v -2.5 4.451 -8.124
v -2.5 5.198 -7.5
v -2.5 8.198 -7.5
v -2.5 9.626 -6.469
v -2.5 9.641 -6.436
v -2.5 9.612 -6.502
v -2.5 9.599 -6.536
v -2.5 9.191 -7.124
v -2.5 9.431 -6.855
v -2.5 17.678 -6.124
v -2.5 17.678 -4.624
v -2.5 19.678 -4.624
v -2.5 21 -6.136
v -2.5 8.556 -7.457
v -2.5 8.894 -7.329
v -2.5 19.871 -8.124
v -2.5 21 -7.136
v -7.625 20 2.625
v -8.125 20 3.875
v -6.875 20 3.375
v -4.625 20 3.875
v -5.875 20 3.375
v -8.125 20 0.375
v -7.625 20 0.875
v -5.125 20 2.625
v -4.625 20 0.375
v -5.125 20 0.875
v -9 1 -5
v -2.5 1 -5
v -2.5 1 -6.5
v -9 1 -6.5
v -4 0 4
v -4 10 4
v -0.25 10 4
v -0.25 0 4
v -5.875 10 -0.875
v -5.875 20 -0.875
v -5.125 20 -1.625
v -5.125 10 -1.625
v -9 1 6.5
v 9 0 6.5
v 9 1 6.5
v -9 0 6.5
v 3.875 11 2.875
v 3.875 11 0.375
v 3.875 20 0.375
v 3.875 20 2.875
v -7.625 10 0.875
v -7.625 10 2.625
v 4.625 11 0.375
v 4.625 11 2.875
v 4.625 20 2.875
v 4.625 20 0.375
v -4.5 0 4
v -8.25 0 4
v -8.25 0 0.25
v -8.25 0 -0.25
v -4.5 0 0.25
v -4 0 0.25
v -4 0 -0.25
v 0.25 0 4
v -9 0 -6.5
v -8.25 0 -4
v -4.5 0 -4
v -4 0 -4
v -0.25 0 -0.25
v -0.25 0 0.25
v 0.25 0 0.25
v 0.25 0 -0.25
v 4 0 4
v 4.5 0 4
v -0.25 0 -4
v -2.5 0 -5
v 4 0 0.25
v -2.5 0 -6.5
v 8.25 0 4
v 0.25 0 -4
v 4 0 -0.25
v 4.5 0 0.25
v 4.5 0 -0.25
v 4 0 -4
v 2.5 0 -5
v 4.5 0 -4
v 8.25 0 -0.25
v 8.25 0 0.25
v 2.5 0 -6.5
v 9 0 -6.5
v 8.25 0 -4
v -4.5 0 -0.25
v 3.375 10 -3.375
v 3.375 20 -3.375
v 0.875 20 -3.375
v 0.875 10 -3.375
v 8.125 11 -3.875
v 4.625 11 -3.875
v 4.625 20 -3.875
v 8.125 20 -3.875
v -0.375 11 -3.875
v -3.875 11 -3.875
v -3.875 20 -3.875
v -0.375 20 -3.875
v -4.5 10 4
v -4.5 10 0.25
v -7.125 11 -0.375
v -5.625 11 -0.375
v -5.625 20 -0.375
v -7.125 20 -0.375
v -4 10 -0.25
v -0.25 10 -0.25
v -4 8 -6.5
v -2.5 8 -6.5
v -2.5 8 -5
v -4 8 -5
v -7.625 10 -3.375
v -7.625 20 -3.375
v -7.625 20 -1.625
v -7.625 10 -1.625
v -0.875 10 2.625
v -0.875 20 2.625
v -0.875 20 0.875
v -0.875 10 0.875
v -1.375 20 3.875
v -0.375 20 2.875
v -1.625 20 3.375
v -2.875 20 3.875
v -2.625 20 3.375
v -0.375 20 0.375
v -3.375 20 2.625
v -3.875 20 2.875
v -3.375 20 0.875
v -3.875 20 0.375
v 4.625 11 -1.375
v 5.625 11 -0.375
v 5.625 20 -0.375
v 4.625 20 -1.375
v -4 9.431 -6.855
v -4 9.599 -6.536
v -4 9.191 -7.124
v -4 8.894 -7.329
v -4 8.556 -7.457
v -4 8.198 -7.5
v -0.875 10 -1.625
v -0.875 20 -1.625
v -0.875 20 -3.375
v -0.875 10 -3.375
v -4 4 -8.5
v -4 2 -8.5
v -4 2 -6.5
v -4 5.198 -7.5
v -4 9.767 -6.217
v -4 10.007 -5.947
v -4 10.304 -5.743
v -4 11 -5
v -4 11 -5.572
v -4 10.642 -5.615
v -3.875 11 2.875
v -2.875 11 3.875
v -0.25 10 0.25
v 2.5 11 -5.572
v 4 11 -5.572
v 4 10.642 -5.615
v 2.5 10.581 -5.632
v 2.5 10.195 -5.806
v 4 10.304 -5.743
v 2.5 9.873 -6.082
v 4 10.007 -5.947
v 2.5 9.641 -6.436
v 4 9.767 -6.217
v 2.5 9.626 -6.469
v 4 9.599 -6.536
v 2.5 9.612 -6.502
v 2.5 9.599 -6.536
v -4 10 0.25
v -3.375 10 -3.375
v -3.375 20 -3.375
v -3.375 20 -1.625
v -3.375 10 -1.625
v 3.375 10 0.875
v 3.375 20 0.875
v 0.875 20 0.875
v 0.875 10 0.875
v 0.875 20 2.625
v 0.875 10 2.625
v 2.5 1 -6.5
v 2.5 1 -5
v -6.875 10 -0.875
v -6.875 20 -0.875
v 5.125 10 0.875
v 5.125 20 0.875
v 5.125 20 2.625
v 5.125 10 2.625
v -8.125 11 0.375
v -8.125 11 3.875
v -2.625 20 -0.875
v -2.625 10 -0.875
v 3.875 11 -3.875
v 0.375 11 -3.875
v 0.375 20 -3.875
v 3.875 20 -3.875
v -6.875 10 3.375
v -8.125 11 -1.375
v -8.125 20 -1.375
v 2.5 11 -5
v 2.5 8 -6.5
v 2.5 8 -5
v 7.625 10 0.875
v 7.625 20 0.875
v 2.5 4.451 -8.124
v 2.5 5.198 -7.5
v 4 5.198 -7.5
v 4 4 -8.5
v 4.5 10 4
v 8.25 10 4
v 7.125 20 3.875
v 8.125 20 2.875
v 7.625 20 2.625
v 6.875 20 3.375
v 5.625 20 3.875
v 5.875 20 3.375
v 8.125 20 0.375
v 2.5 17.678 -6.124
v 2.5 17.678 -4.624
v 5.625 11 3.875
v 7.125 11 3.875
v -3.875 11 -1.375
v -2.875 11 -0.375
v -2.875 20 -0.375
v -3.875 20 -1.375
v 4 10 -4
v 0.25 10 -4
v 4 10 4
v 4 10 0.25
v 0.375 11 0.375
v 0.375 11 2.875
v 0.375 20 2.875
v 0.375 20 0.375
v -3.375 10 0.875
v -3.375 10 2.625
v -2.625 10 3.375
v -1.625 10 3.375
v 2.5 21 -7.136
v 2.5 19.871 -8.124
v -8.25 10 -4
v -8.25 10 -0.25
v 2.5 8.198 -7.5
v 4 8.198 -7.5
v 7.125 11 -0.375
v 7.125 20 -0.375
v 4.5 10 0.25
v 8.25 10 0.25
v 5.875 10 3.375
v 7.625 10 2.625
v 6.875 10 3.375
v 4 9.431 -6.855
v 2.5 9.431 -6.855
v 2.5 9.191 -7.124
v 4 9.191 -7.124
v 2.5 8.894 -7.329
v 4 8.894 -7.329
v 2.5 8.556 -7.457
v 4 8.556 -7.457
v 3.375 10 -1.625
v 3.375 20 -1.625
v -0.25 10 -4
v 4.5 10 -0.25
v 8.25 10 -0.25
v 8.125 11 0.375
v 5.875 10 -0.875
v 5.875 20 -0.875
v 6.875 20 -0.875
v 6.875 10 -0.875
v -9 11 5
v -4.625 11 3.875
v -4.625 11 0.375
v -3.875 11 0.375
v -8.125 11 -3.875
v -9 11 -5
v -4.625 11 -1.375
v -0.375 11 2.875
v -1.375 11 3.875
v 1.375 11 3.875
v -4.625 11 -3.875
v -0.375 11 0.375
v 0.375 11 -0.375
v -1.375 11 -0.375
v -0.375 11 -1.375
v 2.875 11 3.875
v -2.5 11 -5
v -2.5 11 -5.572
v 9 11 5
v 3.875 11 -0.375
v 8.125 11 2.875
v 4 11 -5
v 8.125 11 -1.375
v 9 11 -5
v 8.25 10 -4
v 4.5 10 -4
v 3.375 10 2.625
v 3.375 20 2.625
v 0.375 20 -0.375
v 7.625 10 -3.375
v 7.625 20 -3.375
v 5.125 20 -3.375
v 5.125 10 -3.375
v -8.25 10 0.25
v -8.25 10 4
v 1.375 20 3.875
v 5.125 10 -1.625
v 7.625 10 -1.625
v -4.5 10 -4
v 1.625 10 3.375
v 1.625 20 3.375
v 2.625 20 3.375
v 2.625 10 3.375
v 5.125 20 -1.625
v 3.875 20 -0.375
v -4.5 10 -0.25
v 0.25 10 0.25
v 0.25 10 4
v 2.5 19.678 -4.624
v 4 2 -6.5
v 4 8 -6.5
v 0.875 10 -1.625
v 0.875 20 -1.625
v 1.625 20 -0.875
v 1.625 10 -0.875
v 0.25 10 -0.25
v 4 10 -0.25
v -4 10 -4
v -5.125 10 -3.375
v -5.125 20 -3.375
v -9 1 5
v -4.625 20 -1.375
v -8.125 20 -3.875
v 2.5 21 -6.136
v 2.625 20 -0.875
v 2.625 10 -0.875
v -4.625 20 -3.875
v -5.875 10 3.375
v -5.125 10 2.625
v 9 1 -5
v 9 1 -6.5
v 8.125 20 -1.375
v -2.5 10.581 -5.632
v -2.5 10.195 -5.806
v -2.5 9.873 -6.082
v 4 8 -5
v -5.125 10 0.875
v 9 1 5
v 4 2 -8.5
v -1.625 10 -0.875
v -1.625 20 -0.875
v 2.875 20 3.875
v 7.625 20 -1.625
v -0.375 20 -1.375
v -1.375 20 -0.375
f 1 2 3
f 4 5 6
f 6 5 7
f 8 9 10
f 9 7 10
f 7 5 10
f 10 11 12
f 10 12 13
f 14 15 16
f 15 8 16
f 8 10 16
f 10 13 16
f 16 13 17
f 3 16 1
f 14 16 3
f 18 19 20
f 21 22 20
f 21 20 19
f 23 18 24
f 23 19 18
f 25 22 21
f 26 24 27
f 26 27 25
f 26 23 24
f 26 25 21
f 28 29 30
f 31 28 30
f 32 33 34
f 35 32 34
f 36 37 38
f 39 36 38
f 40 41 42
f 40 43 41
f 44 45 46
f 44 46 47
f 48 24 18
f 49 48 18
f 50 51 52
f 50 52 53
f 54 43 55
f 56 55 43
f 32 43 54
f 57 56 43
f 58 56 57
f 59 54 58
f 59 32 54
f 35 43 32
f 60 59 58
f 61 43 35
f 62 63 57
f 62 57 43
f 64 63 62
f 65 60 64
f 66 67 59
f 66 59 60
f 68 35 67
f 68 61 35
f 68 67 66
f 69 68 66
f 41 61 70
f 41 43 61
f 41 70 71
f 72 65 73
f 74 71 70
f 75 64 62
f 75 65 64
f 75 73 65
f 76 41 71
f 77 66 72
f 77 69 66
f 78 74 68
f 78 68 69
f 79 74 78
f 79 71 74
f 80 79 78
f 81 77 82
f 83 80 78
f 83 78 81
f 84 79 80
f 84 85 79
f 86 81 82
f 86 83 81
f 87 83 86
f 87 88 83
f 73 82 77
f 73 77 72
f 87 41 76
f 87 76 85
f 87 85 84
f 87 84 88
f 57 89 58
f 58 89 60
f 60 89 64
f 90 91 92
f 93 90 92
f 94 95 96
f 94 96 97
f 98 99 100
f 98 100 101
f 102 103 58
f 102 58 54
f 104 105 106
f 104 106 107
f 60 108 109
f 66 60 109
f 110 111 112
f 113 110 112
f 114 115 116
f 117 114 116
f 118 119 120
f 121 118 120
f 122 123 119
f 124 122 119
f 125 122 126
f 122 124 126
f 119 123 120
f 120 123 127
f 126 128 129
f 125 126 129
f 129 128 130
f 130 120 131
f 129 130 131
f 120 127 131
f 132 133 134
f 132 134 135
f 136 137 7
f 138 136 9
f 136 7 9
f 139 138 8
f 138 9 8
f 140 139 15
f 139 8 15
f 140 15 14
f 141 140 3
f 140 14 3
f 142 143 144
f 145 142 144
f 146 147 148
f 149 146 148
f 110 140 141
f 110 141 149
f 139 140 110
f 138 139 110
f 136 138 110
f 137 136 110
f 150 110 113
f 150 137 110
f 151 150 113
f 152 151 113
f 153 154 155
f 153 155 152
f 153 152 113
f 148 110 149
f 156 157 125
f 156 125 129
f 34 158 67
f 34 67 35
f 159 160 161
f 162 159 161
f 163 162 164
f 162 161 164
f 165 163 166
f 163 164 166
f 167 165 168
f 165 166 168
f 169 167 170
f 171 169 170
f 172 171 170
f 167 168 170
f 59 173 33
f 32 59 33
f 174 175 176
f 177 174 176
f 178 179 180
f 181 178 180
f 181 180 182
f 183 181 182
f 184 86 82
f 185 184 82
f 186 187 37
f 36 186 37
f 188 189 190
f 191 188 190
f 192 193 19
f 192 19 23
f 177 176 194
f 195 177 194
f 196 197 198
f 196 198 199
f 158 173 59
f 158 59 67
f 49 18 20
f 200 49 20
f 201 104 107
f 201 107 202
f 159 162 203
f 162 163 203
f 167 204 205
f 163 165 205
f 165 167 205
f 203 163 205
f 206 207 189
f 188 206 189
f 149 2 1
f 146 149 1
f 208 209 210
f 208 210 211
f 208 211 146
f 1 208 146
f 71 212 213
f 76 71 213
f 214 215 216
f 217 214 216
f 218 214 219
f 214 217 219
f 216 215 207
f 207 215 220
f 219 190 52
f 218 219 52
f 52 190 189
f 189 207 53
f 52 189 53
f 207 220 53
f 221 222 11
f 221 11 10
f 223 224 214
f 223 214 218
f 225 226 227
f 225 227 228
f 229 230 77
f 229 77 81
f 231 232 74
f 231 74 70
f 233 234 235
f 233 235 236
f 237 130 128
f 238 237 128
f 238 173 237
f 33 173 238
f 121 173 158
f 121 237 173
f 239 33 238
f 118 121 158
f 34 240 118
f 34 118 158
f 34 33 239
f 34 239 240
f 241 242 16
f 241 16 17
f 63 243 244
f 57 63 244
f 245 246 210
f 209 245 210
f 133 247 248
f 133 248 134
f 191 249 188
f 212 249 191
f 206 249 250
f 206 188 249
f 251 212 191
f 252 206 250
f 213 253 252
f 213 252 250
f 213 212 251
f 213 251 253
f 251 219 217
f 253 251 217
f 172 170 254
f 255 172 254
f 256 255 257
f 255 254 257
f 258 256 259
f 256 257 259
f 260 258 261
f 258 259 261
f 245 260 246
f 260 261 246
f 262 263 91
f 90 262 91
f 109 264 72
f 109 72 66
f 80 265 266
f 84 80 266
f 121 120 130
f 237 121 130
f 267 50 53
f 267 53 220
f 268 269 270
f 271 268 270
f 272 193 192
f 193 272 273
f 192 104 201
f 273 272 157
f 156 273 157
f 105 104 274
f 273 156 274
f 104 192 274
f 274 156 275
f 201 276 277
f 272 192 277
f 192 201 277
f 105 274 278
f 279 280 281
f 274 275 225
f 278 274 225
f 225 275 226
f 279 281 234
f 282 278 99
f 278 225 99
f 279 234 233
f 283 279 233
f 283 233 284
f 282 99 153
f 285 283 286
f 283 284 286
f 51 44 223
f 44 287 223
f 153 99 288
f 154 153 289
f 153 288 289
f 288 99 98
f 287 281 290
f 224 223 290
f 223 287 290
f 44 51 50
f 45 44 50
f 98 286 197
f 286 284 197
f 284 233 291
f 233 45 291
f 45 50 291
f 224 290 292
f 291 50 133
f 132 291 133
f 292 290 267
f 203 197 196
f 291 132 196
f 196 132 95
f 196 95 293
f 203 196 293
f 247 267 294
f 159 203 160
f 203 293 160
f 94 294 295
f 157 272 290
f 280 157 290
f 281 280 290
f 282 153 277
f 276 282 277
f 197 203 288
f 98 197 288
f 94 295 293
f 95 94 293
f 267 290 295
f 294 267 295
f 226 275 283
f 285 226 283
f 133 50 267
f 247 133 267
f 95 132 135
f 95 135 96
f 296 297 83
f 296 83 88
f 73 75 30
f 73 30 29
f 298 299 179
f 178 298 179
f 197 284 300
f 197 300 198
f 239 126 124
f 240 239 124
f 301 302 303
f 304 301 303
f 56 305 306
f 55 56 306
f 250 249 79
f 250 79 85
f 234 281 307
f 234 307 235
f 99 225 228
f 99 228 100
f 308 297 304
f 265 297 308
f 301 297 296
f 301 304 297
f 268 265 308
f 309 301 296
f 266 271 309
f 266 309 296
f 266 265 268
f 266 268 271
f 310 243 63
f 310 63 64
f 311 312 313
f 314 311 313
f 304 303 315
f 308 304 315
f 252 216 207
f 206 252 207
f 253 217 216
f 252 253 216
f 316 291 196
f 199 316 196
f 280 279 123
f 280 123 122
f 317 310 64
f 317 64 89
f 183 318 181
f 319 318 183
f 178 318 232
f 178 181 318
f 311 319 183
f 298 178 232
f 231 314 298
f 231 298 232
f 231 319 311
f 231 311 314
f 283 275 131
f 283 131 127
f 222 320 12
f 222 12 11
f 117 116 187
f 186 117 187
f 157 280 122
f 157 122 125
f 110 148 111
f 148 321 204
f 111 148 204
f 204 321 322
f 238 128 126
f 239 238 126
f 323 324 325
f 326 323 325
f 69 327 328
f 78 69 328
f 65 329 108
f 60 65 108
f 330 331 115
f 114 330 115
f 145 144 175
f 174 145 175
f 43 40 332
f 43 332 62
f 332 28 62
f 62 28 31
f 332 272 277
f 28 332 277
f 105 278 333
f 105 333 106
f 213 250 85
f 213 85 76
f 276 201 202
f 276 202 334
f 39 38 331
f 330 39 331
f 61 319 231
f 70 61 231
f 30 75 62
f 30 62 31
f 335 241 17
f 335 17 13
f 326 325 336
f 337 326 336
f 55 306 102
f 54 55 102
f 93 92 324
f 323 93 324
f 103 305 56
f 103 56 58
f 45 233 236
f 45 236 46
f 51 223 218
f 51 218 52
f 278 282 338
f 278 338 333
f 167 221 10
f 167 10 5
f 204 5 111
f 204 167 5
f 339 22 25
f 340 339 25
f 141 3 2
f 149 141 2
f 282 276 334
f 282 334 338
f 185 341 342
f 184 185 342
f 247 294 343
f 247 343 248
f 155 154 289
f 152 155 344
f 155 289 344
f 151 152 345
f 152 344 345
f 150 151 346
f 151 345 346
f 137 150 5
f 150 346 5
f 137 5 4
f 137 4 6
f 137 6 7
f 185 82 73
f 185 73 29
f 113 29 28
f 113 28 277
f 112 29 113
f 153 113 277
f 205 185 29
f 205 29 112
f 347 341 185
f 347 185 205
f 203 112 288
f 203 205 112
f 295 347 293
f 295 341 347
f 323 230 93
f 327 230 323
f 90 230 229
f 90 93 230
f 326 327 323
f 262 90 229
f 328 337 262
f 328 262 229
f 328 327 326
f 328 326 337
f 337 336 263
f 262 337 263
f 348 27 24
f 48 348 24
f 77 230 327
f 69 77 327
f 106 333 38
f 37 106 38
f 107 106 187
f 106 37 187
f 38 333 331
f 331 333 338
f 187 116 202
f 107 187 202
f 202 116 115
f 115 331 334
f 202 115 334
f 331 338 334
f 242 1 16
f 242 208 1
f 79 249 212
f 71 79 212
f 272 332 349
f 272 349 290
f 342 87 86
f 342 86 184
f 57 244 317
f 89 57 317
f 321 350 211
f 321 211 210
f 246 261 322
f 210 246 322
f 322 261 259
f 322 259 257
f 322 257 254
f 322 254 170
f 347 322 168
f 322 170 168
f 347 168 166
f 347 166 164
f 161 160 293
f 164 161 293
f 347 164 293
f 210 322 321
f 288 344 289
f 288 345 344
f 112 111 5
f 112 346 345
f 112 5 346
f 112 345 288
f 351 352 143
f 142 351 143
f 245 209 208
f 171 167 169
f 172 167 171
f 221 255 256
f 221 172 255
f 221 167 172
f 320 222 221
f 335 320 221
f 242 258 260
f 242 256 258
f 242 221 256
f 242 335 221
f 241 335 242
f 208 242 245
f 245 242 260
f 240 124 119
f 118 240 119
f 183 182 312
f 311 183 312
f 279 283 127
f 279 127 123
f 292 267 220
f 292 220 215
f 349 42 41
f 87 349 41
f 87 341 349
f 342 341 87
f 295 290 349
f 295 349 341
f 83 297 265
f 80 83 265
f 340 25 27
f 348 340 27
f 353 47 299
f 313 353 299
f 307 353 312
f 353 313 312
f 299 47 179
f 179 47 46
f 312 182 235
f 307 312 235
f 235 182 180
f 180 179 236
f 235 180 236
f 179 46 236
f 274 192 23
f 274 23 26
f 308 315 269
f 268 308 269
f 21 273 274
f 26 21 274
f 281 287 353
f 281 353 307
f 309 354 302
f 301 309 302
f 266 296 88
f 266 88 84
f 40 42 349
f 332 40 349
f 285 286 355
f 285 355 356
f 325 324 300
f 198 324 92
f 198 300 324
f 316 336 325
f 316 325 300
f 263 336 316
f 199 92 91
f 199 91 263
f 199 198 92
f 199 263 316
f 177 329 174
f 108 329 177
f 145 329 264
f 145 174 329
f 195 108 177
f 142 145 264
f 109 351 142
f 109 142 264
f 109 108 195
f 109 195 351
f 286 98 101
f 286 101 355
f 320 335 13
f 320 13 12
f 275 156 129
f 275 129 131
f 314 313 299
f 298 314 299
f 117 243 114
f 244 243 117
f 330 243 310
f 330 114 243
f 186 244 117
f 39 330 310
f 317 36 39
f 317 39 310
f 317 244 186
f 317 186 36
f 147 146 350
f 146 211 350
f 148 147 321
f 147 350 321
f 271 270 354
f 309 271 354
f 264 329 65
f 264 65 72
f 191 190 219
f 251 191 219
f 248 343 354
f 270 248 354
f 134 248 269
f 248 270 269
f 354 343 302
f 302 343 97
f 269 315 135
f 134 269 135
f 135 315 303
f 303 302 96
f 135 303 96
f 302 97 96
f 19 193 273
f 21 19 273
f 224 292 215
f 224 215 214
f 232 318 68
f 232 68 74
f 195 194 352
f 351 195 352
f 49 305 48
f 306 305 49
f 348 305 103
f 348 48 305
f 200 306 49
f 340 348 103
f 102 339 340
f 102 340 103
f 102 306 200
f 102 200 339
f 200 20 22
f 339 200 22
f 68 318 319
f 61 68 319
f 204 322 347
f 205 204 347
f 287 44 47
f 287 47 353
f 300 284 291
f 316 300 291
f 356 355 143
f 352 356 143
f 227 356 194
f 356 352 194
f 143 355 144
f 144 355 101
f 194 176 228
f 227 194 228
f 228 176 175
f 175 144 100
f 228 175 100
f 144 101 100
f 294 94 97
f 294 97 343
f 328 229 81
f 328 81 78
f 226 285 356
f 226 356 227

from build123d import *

# Parameters (mm, degrees)
SKIZZE1_W                       = 10
SKIZZE1_H                       = 11
AUFSATZ_LINEAR_AUSTRAGEN1_DEPTH = 9
SKIZZE2_W                       = 1.5
SKIZZE2_H                       = 1
AUFSATZ_LINEAR_AUSTRAGEN2_DEPTH = 9
AUFSATZ_LINEAR_AUSTRAGEN3_DEPTH = 4
SKIZZE4_W                       = 5
SKIZZE4_H                       = 1.5
SCHNITT_LINEAR_AUSTRAGEN1_DEPTH = 12
AUFSATZ_LINEAR_AUSTRAGEN4_DEPTH = 2.5
SKIZZE6_W                       = 3.75
SKIZZE6_H                       = 3.75
SCHNITT_LINEAR_AUSTRAGEN2_DEPTH = 10
LINEARES_MUSTER1_COUNT          = 4
LINEARES_MUSTER1_PITCH          = 4.25
LINEARES_MUSTER1_COUNT_DIR2     = 2
LINEARES_MUSTER1_PITCH_DIR2     = 4.25
SKIZZE7_W                       = 3.5
SKIZZE7_H                       = 3.5
AUFSATZ_LINEAR_AUSTRAGEN5_DEPTH = 9
LINEARES_MUSTER2_COUNT          = 3
LINEARES_MUSTER2_PITCH          = 4.25
LINEARES_MUSTER2_COUNT_DIR2     = 2
LINEARES_MUSTER2_PITCH_DIR2     = 4.25
AUFSATZ_LINEAR_AUSTRAGEN7_DEPTH = 9
LINEARES_MUSTER4_COUNT          = 4
LINEARES_MUSTER4_PITCH          = 4.25
LINEARES_MUSTER4_COUNT_DIR2     = 2
LINEARES_MUSTER4_PITCH_DIR2     = 4.25
SCHNITT_LINEAR_AUSTRAGEN4_DEPTH = 21
LINEARES_MUSTER6_COUNT          = 4
LINEARES_MUSTER6_PITCH          = 4.25
LINEARES_MUSTER6_COUNT_DIR2     = 2
LINEARES_MUSTER6_PITCH_DIR2     = 4.25


with BuildPart() as part:
    # Skizze1 → Aufsatz-Linear austragen1 (new body, symmetric)
    with BuildSketch(Plane(origin=(0, 0, 0), x_dir=(0, 0, -1), z_dir=(1, 0, 0))):
        with Locations((0, 5.5)):
            Rectangle(SKIZZE1_W, SKIZZE1_H)
    extrude(amount=AUFSATZ_LINEAR_AUSTRAGEN1_DEPTH, both=True)

    # Skizze2 → Aufsatz-Linear austragen2 (add, symmetric)
    with BuildSketch(Plane(origin=(0, 0, 0), x_dir=(0, 0, -1), z_dir=(1, 0, 0))):
        with Locations((-5.75, 0.5)):
            Rectangle(SKIZZE2_W, SKIZZE2_H)
        with Locations((5.75, 0.5)):
            Rectangle(SKIZZE2_W, SKIZZE2_H)
    extrude(amount=AUFSATZ_LINEAR_AUSTRAGEN2_DEPTH, both=True)

    # Skizze3 → Aufsatz-Linear austragen3 (add, symmetric)
    with BuildSketch(Plane(origin=(0, 0, 0), x_dir=(0, 0, -1), z_dir=(1, 0, 0))):
        with BuildLine():
            Line((5, 11), (5.571713615, 11))
            ThreePointArc((5.571713615, 11), (5.836038655, 10.149642784), (6.535856807, 9.598979842))
            ThreePointArc((6.535856807, 9.598979842), (7.23567496, 9.048316901), (7.5, 8.197959685))
            Line((7.5, 8.197959685), (7.5, 5.197959685))
            Line((7.5, 5.197959685), (8.5, 4))
            Line((8.5, 4), (8.5, 2))
            Line((8.5, 2), (6.5, 2))
            Line((6.5, 2), (6.5, 8))
            Line((6.5, 8), (5, 8))
            Line((5, 8), (5, 11))
        make_face()
    extrude(amount=AUFSATZ_LINEAR_AUSTRAGEN3_DEPTH, both=True)

    # Skizze4 → Schnitt-Linear austragen1 (cut, through all)
    with BuildSketch(Plane.XZ):
        with Locations((0, -5.75)):
            Rectangle(SKIZZE4_W, SKIZZE4_H)
    extrude(amount=-SCHNITT_LINEAR_AUSTRAGEN1_DEPTH, mode=Mode.SUBTRACT)

    # Skizze5 → Aufsatz-Linear austragen4 (add, symmetric)
    with BuildSketch(Plane(origin=(0, 0, 0), x_dir=(0, 0, -1), z_dir=(1, 0, 0))):
        Polygon((8.123516438, 4.451012129), (8.123516438, 19.870653012), (7.136310593, 21), (6.136310593, 21), (4.623516438, 19.677608169), (4.623516438, 17.677608169), (6.123516438, 17.677608169), (6.5, 8), (6.5, 2), align=None)
    extrude(amount=AUFSATZ_LINEAR_AUSTRAGEN4_DEPTH, both=True)

    # Skizze6 → Schnitt-Linear austragen2 (cut)
    with BuildSketch(Plane.XZ):
        with Locations((-6.375, -2.125)):
            Rectangle(SKIZZE6_W, SKIZZE6_H)
    schnitt_linear_austragen2 = extrude(amount=-SCHNITT_LINEAR_AUSTRAGEN2_DEPTH, mode=Mode.SUBTRACT)

    # Lineares Muster1: Schnitt-Linear austragen2 4 × 2
    with Locations(*[(i * LINEARES_MUSTER1_PITCH, 0, j * LINEARES_MUSTER1_PITCH_DIR2) for i in range(LINEARES_MUSTER1_COUNT) for j in range(LINEARES_MUSTER1_COUNT_DIR2) if (i, j) != (0, 0)]):
        add(schnitt_linear_austragen2, mode=Mode.SUBTRACT)

    # Skizze7 → Aufsatz-Linear austragen5 (add)
    with BuildSketch(Plane(origin=(0, 11, 0), x_dir=(1, 0, 0), z_dir=(0, 1, 0))):
        with Locations((-6.375, -2.125)):
            Rectangle(SKIZZE7_W, SKIZZE7_H)
    aufsatz_linear_austragen5 = extrude(amount=AUFSATZ_LINEAR_AUSTRAGEN5_DEPTH)

    # Lineares Muster2: Aufsatz-Linear austragen5 3 × 2, 4 skipped
    with Locations(*[(i * LINEARES_MUSTER2_PITCH, 0, -j * LINEARES_MUSTER2_PITCH_DIR2) for i in range(LINEARES_MUSTER2_COUNT) for j in range(LINEARES_MUSTER2_COUNT_DIR2) if (i, j) not in ((0, 0), (0, 1), (1, 0), (1, 1), (2, 0))]):
        add(aufsatz_linear_austragen5)

    # Skizze10 → Aufsatz-Linear austragen7 (add)
    with BuildSketch(Plane(origin=(0, 11, 0), x_dir=(1, 0, 0), z_dir=(0, 1, 0))):
        Polygon((-4.625, 1.375), (-5.625, 0.375), (-7.125, 0.375), (-8.125, 1.375), (-8.125, 3.875), (-4.625, 3.875), align=None)
    aufsatz_linear_austragen7 = extrude(amount=AUFSATZ_LINEAR_AUSTRAGEN7_DEPTH)

    # Lineares Muster4: Aufsatz-Linear austragen7 4 × 2, 2 skipped
    with Locations(*[(i * LINEARES_MUSTER4_PITCH, 0, j * LINEARES_MUSTER4_PITCH_DIR2) for i in range(LINEARES_MUSTER4_COUNT) for j in range(LINEARES_MUSTER4_COUNT_DIR2) if (i, j) not in ((0, 0), (0, 1), (2, 0))]):
        add(aufsatz_linear_austragen7)

    # Skizze12 → Schnitt-Linear austragen4 (cut, through all)
    with BuildSketch(Plane(origin=(0, 20, 0), x_dir=(1, 0, 0), z_dir=(0, 1, 0))):
        Polygon((-5.875, 0.875), (-5.125, 1.625), (-5.125, 3.375), (-7.625, 3.375), (-7.625, 1.625), (-6.875, 0.875), align=None)
    schnitt_linear_austragen4 = extrude(amount=-SCHNITT_LINEAR_AUSTRAGEN4_DEPTH, mode=Mode.SUBTRACT)

    # Lineares Muster6: Schnitt-Linear austragen4 4 × 2
    with Locations(*[(i * LINEARES_MUSTER6_PITCH, 0, j * LINEARES_MUSTER6_PITCH_DIR2) for i in range(LINEARES_MUSTER6_COUNT) for j in range(LINEARES_MUSTER6_COUNT_DIR2) if (i, j) != (0, 0)]):
        add(schnitt_linear_austragen4, mode=Mode.SUBTRACT)


solid = part.part
